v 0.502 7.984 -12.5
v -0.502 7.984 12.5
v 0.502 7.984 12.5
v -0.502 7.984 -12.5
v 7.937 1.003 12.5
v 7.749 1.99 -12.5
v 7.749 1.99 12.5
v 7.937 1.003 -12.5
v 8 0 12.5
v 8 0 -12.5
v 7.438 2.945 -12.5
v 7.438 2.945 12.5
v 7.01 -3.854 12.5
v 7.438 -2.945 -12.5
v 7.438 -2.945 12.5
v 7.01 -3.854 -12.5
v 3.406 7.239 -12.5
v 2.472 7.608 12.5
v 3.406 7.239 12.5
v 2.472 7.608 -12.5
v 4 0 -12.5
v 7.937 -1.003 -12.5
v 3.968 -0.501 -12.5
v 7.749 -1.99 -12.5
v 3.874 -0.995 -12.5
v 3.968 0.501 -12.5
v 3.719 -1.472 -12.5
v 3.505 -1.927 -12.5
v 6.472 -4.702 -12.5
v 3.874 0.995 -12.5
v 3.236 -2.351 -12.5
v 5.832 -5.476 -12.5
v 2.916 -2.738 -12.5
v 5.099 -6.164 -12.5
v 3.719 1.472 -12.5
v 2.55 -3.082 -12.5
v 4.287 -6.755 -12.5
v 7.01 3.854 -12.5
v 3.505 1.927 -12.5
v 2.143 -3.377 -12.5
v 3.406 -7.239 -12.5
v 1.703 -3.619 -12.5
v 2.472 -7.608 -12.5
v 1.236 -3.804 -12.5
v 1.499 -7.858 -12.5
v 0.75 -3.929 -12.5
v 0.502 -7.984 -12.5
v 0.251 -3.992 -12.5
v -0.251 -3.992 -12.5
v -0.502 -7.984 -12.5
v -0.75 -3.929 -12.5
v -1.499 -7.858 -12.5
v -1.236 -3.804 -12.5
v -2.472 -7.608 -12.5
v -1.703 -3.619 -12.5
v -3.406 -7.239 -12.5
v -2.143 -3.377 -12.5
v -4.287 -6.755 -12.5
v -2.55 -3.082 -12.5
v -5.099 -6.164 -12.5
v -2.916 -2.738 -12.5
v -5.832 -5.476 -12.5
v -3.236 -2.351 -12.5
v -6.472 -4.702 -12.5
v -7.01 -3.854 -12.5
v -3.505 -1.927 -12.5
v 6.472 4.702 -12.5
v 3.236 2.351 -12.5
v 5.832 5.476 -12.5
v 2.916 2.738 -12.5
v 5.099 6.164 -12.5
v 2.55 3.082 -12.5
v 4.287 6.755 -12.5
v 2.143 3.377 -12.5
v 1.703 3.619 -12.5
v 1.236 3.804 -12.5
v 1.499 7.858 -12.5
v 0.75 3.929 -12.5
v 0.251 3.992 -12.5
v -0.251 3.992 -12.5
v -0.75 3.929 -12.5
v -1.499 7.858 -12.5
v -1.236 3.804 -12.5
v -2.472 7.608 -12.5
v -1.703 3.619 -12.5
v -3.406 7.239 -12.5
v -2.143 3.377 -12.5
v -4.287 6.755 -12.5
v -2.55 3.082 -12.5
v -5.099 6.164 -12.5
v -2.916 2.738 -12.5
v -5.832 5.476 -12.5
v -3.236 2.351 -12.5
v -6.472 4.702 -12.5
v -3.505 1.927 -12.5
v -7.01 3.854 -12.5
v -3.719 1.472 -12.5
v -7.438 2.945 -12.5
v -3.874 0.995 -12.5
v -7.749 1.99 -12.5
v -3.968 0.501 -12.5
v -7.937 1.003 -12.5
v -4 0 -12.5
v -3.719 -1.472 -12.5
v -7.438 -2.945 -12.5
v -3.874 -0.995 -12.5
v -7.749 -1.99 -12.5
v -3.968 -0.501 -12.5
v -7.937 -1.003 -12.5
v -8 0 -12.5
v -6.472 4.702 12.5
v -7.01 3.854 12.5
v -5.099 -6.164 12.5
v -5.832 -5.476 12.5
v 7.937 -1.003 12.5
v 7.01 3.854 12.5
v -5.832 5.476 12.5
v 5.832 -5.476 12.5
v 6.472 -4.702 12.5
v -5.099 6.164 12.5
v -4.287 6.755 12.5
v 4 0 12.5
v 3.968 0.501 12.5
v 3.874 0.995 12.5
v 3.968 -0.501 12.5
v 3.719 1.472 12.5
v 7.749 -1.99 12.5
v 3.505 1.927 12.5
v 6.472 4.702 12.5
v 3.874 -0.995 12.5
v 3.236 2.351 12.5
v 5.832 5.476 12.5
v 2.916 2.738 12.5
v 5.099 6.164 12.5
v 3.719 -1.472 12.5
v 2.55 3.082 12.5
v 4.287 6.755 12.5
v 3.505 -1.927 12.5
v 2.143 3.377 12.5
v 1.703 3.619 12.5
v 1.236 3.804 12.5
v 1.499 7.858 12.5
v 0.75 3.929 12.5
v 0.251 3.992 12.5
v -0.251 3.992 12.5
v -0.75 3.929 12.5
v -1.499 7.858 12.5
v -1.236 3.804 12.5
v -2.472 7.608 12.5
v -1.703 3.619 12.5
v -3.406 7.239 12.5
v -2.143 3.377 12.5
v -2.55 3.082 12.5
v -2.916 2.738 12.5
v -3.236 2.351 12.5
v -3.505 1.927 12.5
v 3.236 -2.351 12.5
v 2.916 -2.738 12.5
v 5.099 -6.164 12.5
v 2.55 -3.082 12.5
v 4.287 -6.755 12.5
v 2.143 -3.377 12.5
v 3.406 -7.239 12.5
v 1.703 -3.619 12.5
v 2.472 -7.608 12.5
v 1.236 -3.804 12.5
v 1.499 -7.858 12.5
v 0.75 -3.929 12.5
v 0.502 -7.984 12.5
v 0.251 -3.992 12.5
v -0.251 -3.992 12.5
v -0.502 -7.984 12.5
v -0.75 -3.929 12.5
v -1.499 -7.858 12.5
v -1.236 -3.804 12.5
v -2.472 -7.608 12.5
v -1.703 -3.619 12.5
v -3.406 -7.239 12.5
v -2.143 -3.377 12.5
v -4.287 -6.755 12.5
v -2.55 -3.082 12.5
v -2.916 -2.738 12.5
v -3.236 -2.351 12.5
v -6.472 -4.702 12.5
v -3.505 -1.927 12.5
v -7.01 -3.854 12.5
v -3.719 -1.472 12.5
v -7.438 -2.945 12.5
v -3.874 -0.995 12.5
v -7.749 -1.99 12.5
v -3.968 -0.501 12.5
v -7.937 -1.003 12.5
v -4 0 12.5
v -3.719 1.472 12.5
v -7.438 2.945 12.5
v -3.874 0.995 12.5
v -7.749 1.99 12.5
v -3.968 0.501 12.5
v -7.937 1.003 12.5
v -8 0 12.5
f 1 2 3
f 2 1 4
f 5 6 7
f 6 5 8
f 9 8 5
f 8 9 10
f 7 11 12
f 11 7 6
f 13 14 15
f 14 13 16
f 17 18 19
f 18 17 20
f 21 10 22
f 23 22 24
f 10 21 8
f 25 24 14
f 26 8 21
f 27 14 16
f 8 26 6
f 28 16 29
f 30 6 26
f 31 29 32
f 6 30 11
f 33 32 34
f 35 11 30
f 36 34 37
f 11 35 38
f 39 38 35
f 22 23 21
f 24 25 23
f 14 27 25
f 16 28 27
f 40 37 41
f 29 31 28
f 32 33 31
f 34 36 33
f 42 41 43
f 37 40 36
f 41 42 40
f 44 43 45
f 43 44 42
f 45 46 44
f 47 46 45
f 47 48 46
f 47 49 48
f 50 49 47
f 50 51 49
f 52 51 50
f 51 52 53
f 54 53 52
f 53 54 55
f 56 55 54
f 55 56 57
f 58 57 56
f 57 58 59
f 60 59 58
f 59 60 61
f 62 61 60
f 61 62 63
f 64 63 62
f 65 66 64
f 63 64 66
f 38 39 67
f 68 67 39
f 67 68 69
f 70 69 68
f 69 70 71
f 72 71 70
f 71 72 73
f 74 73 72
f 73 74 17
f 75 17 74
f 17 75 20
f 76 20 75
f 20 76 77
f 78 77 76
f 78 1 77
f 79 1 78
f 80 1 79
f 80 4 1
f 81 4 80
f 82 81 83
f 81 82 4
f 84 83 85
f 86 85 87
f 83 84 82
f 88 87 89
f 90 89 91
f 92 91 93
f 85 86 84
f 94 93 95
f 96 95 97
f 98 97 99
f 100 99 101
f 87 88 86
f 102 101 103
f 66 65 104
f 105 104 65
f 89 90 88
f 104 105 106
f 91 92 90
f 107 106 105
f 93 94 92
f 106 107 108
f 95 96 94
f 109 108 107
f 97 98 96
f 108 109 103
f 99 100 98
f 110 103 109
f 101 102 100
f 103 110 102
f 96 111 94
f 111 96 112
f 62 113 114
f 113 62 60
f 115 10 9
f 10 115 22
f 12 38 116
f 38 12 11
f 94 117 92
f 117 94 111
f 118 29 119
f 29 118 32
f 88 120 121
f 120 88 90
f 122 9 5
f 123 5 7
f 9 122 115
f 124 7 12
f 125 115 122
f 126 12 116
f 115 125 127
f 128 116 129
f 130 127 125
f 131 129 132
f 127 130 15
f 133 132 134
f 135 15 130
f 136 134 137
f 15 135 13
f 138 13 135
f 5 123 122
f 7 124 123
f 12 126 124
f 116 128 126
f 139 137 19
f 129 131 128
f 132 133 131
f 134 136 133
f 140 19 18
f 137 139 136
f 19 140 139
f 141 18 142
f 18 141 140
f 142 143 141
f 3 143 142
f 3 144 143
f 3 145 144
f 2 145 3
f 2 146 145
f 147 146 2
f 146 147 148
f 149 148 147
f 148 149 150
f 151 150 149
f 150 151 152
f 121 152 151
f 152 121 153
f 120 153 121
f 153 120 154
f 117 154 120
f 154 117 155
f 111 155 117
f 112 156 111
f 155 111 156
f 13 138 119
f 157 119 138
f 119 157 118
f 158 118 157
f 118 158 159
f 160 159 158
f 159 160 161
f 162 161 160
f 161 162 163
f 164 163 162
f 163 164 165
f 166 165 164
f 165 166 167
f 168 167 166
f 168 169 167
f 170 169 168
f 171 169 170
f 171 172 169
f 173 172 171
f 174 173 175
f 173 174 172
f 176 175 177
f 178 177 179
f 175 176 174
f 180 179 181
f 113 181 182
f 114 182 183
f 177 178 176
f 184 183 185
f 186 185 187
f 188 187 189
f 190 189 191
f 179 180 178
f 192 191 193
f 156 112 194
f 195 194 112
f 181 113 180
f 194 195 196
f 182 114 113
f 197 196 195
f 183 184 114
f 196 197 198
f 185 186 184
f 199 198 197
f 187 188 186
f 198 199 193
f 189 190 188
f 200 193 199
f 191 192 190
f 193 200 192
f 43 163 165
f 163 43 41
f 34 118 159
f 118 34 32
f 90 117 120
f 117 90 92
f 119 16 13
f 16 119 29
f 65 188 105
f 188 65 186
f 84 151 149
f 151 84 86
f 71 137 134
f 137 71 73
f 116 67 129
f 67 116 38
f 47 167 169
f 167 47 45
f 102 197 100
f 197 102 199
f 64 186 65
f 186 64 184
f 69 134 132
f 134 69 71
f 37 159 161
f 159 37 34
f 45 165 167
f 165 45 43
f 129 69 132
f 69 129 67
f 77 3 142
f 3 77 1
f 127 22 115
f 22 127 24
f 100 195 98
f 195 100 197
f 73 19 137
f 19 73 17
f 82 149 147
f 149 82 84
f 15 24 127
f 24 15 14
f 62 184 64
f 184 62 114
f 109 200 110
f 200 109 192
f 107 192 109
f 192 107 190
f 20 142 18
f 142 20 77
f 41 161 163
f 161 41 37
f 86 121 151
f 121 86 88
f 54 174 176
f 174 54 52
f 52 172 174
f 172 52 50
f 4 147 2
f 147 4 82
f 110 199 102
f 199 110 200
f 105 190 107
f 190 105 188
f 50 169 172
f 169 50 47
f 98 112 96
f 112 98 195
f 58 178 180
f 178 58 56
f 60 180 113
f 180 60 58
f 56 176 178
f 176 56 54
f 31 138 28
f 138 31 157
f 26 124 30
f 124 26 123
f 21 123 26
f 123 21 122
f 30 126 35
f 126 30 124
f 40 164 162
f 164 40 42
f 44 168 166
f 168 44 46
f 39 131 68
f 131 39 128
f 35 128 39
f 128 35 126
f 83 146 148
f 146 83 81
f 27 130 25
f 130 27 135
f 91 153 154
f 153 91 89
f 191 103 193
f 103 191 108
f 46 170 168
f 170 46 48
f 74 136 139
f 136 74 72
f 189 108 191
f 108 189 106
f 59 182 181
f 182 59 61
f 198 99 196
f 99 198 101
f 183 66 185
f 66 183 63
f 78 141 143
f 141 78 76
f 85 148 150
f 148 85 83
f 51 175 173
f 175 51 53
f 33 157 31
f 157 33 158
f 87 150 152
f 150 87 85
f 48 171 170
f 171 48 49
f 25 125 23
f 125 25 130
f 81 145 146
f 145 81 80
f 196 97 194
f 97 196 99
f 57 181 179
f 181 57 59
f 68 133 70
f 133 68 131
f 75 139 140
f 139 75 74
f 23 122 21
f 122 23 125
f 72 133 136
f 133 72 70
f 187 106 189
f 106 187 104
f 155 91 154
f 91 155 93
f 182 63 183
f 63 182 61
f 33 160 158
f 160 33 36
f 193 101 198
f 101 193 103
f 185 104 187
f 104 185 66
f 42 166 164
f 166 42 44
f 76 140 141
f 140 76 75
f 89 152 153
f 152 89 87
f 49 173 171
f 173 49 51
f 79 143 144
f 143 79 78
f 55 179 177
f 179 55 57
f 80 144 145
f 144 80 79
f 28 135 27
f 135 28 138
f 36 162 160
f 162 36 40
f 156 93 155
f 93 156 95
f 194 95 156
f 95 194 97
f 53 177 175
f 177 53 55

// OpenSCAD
$fn = 50;


difference() {
	union() {
		translate(v = [0, 0, -12.5000000000]) {
			cylinder(h = 25, r = 8.0000000000);
		}
	}
	union() {
		translate(v = [0, 0, -100.0000000000]) {
			cylinder(h = 200, r = 4.0000000000);
		}
	}
}
